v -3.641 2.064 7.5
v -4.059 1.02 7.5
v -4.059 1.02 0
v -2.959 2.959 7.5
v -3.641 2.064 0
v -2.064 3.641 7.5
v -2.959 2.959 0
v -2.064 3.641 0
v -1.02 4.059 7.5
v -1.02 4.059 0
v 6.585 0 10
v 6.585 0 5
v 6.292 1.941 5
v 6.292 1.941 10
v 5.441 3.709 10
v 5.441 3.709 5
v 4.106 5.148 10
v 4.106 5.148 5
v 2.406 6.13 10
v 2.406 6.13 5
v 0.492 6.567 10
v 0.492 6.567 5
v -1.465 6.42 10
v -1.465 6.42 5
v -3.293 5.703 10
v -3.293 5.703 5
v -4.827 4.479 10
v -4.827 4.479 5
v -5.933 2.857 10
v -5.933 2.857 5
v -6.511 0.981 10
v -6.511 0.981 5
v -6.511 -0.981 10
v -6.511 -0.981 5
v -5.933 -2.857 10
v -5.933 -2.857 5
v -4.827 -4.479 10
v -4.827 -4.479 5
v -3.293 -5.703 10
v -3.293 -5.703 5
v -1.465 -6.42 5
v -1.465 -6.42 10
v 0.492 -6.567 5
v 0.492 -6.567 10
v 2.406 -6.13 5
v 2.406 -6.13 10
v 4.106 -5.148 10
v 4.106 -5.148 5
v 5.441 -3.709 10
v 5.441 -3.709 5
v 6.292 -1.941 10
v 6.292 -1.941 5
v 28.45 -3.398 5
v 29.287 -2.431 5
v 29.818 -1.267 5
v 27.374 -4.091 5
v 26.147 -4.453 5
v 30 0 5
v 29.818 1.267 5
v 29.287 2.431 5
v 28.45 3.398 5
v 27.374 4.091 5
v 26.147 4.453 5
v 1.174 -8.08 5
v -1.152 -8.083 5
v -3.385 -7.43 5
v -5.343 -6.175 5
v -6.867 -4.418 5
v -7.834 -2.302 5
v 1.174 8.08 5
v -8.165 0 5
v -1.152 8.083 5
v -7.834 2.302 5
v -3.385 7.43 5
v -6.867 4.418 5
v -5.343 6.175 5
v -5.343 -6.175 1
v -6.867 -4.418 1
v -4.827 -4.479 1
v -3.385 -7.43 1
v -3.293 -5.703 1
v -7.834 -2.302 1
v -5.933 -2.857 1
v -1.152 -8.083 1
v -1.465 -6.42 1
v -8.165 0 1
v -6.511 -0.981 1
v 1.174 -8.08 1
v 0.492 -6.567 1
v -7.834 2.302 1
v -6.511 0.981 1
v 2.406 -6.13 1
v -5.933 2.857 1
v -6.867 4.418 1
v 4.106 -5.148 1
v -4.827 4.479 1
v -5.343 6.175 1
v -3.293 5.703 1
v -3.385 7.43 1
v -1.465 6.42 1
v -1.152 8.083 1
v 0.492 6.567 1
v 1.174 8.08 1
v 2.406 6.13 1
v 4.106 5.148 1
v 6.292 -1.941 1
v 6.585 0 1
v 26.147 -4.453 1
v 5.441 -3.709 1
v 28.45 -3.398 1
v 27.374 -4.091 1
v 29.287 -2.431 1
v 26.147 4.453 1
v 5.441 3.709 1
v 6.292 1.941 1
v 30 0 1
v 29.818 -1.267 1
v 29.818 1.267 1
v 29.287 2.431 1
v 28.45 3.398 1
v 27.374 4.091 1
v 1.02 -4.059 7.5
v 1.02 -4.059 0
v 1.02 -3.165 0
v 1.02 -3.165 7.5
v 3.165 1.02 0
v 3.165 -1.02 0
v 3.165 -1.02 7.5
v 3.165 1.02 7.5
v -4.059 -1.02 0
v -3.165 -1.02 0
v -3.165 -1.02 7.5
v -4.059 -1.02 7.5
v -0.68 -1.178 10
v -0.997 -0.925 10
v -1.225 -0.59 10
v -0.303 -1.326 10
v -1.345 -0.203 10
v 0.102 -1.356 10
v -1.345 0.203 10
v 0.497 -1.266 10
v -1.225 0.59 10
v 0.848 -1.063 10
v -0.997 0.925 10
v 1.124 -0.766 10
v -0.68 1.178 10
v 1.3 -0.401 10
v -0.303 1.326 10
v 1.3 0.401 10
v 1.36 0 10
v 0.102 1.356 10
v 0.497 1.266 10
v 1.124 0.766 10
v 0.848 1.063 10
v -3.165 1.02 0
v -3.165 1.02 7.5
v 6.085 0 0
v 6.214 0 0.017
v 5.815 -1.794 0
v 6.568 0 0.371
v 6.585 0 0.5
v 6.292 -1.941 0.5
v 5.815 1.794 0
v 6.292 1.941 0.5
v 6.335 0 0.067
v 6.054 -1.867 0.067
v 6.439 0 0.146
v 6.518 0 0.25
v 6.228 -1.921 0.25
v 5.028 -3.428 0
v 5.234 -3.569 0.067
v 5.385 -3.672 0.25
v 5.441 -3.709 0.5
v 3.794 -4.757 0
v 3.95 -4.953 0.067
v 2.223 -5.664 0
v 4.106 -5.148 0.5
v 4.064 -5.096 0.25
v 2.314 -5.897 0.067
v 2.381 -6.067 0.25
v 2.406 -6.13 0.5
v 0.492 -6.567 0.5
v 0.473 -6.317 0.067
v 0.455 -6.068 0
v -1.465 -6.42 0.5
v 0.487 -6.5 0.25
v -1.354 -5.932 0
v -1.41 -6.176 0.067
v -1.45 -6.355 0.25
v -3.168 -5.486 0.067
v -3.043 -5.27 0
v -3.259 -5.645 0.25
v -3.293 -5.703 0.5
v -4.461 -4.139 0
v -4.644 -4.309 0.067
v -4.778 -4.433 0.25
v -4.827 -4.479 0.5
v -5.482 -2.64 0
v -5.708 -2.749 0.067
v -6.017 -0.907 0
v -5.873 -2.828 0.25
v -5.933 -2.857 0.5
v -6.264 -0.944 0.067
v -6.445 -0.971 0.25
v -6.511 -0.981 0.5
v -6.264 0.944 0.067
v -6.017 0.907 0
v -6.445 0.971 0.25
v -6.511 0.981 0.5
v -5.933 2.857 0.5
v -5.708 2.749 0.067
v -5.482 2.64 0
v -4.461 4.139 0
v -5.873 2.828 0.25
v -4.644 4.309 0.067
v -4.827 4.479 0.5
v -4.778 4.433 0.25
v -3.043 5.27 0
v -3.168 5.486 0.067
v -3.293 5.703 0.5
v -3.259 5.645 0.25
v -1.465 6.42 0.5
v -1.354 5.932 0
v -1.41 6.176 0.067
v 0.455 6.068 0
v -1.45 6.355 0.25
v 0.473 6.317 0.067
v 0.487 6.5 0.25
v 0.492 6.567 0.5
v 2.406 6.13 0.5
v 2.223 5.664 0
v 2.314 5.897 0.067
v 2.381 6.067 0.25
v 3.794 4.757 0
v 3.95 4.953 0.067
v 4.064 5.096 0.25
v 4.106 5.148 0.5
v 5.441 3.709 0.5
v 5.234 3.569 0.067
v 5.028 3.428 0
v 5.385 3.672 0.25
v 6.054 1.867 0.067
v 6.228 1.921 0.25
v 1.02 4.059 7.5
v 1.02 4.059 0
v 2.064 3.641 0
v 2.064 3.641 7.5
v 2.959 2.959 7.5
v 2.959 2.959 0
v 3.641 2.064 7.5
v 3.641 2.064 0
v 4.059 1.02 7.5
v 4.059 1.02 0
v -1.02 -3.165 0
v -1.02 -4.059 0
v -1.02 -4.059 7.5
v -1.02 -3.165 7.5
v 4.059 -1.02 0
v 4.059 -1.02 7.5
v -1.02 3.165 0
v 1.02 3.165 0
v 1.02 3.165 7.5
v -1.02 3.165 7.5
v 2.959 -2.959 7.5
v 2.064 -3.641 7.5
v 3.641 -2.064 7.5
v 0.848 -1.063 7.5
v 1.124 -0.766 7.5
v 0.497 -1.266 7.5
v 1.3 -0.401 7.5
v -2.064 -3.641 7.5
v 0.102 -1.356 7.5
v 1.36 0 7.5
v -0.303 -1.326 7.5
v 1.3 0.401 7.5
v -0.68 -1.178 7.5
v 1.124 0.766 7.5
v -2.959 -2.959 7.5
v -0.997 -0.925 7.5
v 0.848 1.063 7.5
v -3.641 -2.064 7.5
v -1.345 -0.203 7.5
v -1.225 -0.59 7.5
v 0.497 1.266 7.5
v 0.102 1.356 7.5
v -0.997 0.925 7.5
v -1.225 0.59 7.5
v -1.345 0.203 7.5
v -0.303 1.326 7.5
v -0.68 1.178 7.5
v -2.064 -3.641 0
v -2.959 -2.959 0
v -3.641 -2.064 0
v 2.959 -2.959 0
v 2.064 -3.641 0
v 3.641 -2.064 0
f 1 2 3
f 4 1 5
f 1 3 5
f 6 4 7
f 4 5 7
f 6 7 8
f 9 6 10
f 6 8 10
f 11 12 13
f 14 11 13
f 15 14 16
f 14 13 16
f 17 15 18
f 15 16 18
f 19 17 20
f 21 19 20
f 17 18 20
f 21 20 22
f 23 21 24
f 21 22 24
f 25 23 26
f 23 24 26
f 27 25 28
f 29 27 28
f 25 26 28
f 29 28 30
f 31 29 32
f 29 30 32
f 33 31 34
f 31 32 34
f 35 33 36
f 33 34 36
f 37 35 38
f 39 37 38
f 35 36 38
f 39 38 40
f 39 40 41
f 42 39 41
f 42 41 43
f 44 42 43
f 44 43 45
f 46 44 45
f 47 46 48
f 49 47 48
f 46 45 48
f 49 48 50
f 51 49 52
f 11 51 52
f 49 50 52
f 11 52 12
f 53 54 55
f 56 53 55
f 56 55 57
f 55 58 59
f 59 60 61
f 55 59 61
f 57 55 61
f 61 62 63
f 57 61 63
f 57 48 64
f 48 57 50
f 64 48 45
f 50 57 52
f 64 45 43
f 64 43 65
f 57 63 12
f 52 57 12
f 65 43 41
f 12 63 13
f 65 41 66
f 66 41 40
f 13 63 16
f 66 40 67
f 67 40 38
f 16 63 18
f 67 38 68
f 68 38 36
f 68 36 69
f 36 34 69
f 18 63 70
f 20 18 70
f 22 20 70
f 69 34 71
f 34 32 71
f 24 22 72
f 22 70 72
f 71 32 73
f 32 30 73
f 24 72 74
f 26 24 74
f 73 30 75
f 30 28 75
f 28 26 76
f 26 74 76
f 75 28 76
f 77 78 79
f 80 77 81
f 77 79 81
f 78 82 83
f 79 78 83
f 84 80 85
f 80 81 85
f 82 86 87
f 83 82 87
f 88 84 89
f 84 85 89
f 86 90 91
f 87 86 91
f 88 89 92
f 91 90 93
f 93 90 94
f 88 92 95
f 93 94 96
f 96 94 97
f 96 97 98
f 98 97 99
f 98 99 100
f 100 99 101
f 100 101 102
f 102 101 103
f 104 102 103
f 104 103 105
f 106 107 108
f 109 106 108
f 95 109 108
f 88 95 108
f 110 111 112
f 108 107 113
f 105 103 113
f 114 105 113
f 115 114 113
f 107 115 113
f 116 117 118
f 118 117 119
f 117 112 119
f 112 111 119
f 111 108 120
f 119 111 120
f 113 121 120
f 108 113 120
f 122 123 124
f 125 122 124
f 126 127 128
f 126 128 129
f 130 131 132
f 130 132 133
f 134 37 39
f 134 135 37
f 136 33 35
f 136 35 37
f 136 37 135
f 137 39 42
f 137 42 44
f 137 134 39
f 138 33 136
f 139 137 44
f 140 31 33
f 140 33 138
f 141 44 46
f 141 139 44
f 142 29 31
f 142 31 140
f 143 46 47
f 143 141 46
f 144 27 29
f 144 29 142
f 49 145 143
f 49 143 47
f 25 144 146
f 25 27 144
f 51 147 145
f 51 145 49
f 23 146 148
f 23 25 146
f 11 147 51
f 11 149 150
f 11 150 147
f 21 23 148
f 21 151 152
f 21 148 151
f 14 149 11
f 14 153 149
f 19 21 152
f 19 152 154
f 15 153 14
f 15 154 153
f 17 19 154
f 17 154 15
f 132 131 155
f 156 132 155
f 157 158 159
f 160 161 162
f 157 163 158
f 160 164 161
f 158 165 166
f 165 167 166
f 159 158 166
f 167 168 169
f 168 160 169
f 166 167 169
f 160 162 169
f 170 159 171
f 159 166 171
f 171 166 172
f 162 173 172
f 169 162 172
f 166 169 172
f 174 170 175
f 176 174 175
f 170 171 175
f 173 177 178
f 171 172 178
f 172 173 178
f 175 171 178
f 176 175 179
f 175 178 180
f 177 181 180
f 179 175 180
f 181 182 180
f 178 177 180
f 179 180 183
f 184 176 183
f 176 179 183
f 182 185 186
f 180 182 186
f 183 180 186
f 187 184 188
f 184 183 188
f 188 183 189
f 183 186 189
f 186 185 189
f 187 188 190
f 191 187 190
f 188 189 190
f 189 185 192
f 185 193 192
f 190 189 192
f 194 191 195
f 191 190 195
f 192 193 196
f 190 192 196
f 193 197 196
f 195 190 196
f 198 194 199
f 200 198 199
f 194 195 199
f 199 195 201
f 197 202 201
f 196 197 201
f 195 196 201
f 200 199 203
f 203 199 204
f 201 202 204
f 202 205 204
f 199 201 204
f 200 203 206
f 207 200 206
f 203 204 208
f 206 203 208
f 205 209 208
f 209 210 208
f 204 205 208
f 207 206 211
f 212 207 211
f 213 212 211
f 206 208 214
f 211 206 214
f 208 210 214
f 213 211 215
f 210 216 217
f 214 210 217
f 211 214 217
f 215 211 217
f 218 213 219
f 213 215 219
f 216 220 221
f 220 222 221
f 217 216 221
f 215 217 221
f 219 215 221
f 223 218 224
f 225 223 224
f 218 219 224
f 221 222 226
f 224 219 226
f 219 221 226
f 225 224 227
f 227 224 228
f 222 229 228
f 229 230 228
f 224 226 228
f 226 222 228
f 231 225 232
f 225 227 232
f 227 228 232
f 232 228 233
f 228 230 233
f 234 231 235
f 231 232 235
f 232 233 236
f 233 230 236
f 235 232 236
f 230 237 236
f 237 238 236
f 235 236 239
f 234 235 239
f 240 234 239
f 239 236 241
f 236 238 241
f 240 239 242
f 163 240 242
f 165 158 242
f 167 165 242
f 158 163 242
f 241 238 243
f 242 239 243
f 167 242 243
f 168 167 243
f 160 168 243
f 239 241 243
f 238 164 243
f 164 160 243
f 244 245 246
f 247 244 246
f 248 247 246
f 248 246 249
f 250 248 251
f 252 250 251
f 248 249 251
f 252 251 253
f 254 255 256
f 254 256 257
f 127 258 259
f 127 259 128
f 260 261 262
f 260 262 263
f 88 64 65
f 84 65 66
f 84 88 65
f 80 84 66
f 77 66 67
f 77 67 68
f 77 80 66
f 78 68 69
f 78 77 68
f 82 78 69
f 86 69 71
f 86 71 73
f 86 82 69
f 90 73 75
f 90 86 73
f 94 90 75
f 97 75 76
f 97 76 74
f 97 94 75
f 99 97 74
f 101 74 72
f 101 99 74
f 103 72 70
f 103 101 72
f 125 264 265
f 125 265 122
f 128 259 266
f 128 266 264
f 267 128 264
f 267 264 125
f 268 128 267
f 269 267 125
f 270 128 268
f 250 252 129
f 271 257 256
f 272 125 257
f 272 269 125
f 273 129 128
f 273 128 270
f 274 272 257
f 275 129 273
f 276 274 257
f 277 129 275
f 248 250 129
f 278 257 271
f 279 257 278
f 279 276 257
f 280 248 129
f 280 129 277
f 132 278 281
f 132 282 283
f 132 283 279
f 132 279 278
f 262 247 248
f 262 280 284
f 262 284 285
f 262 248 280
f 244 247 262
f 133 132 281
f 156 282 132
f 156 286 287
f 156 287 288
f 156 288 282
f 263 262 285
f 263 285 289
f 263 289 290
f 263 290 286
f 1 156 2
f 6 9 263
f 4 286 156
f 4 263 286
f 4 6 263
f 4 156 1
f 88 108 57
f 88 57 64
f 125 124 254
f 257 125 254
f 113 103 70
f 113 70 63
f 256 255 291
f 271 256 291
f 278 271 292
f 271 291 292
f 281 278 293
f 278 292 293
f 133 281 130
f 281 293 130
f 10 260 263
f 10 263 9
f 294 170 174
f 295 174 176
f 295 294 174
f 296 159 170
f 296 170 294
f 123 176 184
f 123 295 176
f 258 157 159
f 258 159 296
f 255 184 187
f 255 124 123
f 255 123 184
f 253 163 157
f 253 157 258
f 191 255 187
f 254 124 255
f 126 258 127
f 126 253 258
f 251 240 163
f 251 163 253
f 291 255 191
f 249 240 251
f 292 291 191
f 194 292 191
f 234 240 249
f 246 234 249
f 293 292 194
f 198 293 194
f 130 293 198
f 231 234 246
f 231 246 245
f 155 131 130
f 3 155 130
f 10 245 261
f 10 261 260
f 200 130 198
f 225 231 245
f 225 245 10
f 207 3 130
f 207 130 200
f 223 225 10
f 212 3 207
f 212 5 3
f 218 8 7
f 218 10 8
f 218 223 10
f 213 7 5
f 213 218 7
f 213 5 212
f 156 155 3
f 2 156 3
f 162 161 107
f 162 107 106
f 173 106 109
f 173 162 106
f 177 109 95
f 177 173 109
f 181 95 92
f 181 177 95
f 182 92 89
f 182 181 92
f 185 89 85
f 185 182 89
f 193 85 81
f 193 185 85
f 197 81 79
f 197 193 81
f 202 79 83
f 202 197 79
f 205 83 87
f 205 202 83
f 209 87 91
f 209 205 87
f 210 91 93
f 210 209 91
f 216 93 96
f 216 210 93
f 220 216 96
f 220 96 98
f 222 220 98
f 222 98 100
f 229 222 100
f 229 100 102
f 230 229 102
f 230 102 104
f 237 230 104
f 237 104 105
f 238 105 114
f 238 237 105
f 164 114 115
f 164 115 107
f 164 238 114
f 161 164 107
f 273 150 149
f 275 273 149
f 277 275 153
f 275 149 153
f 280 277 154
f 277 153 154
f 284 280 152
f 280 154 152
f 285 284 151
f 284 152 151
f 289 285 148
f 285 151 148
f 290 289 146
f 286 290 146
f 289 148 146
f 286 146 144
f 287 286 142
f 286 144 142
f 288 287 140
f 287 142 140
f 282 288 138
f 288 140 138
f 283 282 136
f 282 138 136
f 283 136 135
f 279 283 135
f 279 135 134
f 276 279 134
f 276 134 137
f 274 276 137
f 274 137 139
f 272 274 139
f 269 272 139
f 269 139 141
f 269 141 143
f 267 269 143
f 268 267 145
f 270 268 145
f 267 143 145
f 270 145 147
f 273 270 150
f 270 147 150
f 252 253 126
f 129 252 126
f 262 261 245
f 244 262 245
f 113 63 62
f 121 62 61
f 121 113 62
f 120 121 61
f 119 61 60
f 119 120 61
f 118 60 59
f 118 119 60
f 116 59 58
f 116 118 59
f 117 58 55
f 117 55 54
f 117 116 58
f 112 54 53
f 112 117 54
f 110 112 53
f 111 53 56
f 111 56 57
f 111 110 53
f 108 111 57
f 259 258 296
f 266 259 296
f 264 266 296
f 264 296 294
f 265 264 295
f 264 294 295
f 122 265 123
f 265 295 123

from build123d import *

# Parameters (mm, degrees)
BOSS_EXTRUDE3_DEPTH = 5
SKETCH3_R           = 6.585
BOSS_EXTRUDE4_DEPTH = 5
SKETCH5_R           = 4.185
CUT_EXTRUDE1_DEPTH  = 7.5
SKETCH4_W           = 2.04
SKETCH4_H           = 1.02
SKETCH4_W_2         = 1.02
SKETCH4_H_2         = 2.04
BOSS_EXTRUDE5_DEPTH = 7.5
SKETCH6_R           = 1.36
CUT_EXTRUDE2_DEPTH  = 2.5
SKETCH7_R           = 6.585
CUT_EXTRUDE3_DEPTH  = 1
FILLET1_R           = 0.5


with BuildPart() as part:
    # Sketch1 → Boss-Extrude3 (new body)
    with BuildSketch(Plane.XY):
        with BuildLine():
            Line((1.173518627, 8.08022766), (26.146764706, 4.453279176))
            ThreePointArc((26.146764706, 4.453279176), (30, 0), (26.146764706, -4.453279176))
            Line((26.146764706, -4.453279176), (1.173518627, -8.08022766))
            ThreePointArc((1.173518627, -8.08022766), (-8.165, 0), (1.173518627, 8.08022766))
        make_face()
    extrude(amount=BOSS_EXTRUDE3_DEPTH)

    # Sketch3 → Boss-Extrude4 (add)
    with BuildSketch(Plane.XY.offset(5)):
        Circle(SKETCH3_R)
    extrude(amount=BOSS_EXTRUDE4_DEPTH)

    # Sketch5 → Cut-Extrude1 (cut)
    with BuildSketch(Plane(origin=(0, 0, 0), x_dir=(-1, 0, 0), z_dir=(0, 0, -1))):
        Circle(SKETCH5_R)
    extrude(amount=-CUT_EXTRUDE1_DEPTH, mode=Mode.SUBTRACT)

    # Sketch4 → Boss-Extrude5 (add)
    with BuildSketch(Plane(origin=(0, 0, 0), x_dir=(-1, 0, 0), z_dir=(0, 0, -1))):
        with Locations((0, 3.675)):
            Rectangle(SKETCH4_W, SKETCH4_H)
        with Locations((3.675, 0)):
            Rectangle(SKETCH4_W_2, SKETCH4_H_2)
        with Locations((0, -3.675)):
            Rectangle(SKETCH4_W, SKETCH4_H)
        with Locations((-3.675, 0)):
            Rectangle(SKETCH4_W_2, SKETCH4_H_2)
    extrude(amount=-BOSS_EXTRUDE5_DEPTH)

    # Sketch6 → Cut-Extrude2 (cut)
    with BuildSketch(Plane.XY.offset(10)):
        Circle(SKETCH6_R)
    extrude(amount=-CUT_EXTRUDE2_DEPTH, mode=Mode.SUBTRACT)

    # Sketch7 → Cut-Extrude3 (cut)
    with BuildSketch(Plane(origin=(0, 0, 0), x_dir=(-1, 0, 0), z_dir=(0, 0, -1))):
        with BuildLine():
            Line((-26.146764706, 4.453279176), (-1.173518627, 8.08022766))
            ThreePointArc((-1.173518627, 8.08022766), (8.165, 0), (-1.173518627, -8.08022766))
            Line((-1.173518627, -8.08022766), (-26.146764706, -4.453279176))
            ThreePointArc((-26.146764706, -4.453279176), (-30, 0), (-26.146764706, 4.453279176))
        make_face()
        with Locations(Location((0, 0, 0), (0, 0, 180))):
            Circle(SKETCH7_R, mode=Mode.SUBTRACT)
    extrude(amount=-CUT_EXTRUDE3_DEPTH, mode=Mode.SUBTRACT)

    # Fillet1
    fillet1_edges = [part.edges().sort_by_distance(p)[0] for p in [
        (-6.585, 0, 0),
    ]]
    fillet(fillet1_edges, radius=FILLET1_R)


solid = part.part
